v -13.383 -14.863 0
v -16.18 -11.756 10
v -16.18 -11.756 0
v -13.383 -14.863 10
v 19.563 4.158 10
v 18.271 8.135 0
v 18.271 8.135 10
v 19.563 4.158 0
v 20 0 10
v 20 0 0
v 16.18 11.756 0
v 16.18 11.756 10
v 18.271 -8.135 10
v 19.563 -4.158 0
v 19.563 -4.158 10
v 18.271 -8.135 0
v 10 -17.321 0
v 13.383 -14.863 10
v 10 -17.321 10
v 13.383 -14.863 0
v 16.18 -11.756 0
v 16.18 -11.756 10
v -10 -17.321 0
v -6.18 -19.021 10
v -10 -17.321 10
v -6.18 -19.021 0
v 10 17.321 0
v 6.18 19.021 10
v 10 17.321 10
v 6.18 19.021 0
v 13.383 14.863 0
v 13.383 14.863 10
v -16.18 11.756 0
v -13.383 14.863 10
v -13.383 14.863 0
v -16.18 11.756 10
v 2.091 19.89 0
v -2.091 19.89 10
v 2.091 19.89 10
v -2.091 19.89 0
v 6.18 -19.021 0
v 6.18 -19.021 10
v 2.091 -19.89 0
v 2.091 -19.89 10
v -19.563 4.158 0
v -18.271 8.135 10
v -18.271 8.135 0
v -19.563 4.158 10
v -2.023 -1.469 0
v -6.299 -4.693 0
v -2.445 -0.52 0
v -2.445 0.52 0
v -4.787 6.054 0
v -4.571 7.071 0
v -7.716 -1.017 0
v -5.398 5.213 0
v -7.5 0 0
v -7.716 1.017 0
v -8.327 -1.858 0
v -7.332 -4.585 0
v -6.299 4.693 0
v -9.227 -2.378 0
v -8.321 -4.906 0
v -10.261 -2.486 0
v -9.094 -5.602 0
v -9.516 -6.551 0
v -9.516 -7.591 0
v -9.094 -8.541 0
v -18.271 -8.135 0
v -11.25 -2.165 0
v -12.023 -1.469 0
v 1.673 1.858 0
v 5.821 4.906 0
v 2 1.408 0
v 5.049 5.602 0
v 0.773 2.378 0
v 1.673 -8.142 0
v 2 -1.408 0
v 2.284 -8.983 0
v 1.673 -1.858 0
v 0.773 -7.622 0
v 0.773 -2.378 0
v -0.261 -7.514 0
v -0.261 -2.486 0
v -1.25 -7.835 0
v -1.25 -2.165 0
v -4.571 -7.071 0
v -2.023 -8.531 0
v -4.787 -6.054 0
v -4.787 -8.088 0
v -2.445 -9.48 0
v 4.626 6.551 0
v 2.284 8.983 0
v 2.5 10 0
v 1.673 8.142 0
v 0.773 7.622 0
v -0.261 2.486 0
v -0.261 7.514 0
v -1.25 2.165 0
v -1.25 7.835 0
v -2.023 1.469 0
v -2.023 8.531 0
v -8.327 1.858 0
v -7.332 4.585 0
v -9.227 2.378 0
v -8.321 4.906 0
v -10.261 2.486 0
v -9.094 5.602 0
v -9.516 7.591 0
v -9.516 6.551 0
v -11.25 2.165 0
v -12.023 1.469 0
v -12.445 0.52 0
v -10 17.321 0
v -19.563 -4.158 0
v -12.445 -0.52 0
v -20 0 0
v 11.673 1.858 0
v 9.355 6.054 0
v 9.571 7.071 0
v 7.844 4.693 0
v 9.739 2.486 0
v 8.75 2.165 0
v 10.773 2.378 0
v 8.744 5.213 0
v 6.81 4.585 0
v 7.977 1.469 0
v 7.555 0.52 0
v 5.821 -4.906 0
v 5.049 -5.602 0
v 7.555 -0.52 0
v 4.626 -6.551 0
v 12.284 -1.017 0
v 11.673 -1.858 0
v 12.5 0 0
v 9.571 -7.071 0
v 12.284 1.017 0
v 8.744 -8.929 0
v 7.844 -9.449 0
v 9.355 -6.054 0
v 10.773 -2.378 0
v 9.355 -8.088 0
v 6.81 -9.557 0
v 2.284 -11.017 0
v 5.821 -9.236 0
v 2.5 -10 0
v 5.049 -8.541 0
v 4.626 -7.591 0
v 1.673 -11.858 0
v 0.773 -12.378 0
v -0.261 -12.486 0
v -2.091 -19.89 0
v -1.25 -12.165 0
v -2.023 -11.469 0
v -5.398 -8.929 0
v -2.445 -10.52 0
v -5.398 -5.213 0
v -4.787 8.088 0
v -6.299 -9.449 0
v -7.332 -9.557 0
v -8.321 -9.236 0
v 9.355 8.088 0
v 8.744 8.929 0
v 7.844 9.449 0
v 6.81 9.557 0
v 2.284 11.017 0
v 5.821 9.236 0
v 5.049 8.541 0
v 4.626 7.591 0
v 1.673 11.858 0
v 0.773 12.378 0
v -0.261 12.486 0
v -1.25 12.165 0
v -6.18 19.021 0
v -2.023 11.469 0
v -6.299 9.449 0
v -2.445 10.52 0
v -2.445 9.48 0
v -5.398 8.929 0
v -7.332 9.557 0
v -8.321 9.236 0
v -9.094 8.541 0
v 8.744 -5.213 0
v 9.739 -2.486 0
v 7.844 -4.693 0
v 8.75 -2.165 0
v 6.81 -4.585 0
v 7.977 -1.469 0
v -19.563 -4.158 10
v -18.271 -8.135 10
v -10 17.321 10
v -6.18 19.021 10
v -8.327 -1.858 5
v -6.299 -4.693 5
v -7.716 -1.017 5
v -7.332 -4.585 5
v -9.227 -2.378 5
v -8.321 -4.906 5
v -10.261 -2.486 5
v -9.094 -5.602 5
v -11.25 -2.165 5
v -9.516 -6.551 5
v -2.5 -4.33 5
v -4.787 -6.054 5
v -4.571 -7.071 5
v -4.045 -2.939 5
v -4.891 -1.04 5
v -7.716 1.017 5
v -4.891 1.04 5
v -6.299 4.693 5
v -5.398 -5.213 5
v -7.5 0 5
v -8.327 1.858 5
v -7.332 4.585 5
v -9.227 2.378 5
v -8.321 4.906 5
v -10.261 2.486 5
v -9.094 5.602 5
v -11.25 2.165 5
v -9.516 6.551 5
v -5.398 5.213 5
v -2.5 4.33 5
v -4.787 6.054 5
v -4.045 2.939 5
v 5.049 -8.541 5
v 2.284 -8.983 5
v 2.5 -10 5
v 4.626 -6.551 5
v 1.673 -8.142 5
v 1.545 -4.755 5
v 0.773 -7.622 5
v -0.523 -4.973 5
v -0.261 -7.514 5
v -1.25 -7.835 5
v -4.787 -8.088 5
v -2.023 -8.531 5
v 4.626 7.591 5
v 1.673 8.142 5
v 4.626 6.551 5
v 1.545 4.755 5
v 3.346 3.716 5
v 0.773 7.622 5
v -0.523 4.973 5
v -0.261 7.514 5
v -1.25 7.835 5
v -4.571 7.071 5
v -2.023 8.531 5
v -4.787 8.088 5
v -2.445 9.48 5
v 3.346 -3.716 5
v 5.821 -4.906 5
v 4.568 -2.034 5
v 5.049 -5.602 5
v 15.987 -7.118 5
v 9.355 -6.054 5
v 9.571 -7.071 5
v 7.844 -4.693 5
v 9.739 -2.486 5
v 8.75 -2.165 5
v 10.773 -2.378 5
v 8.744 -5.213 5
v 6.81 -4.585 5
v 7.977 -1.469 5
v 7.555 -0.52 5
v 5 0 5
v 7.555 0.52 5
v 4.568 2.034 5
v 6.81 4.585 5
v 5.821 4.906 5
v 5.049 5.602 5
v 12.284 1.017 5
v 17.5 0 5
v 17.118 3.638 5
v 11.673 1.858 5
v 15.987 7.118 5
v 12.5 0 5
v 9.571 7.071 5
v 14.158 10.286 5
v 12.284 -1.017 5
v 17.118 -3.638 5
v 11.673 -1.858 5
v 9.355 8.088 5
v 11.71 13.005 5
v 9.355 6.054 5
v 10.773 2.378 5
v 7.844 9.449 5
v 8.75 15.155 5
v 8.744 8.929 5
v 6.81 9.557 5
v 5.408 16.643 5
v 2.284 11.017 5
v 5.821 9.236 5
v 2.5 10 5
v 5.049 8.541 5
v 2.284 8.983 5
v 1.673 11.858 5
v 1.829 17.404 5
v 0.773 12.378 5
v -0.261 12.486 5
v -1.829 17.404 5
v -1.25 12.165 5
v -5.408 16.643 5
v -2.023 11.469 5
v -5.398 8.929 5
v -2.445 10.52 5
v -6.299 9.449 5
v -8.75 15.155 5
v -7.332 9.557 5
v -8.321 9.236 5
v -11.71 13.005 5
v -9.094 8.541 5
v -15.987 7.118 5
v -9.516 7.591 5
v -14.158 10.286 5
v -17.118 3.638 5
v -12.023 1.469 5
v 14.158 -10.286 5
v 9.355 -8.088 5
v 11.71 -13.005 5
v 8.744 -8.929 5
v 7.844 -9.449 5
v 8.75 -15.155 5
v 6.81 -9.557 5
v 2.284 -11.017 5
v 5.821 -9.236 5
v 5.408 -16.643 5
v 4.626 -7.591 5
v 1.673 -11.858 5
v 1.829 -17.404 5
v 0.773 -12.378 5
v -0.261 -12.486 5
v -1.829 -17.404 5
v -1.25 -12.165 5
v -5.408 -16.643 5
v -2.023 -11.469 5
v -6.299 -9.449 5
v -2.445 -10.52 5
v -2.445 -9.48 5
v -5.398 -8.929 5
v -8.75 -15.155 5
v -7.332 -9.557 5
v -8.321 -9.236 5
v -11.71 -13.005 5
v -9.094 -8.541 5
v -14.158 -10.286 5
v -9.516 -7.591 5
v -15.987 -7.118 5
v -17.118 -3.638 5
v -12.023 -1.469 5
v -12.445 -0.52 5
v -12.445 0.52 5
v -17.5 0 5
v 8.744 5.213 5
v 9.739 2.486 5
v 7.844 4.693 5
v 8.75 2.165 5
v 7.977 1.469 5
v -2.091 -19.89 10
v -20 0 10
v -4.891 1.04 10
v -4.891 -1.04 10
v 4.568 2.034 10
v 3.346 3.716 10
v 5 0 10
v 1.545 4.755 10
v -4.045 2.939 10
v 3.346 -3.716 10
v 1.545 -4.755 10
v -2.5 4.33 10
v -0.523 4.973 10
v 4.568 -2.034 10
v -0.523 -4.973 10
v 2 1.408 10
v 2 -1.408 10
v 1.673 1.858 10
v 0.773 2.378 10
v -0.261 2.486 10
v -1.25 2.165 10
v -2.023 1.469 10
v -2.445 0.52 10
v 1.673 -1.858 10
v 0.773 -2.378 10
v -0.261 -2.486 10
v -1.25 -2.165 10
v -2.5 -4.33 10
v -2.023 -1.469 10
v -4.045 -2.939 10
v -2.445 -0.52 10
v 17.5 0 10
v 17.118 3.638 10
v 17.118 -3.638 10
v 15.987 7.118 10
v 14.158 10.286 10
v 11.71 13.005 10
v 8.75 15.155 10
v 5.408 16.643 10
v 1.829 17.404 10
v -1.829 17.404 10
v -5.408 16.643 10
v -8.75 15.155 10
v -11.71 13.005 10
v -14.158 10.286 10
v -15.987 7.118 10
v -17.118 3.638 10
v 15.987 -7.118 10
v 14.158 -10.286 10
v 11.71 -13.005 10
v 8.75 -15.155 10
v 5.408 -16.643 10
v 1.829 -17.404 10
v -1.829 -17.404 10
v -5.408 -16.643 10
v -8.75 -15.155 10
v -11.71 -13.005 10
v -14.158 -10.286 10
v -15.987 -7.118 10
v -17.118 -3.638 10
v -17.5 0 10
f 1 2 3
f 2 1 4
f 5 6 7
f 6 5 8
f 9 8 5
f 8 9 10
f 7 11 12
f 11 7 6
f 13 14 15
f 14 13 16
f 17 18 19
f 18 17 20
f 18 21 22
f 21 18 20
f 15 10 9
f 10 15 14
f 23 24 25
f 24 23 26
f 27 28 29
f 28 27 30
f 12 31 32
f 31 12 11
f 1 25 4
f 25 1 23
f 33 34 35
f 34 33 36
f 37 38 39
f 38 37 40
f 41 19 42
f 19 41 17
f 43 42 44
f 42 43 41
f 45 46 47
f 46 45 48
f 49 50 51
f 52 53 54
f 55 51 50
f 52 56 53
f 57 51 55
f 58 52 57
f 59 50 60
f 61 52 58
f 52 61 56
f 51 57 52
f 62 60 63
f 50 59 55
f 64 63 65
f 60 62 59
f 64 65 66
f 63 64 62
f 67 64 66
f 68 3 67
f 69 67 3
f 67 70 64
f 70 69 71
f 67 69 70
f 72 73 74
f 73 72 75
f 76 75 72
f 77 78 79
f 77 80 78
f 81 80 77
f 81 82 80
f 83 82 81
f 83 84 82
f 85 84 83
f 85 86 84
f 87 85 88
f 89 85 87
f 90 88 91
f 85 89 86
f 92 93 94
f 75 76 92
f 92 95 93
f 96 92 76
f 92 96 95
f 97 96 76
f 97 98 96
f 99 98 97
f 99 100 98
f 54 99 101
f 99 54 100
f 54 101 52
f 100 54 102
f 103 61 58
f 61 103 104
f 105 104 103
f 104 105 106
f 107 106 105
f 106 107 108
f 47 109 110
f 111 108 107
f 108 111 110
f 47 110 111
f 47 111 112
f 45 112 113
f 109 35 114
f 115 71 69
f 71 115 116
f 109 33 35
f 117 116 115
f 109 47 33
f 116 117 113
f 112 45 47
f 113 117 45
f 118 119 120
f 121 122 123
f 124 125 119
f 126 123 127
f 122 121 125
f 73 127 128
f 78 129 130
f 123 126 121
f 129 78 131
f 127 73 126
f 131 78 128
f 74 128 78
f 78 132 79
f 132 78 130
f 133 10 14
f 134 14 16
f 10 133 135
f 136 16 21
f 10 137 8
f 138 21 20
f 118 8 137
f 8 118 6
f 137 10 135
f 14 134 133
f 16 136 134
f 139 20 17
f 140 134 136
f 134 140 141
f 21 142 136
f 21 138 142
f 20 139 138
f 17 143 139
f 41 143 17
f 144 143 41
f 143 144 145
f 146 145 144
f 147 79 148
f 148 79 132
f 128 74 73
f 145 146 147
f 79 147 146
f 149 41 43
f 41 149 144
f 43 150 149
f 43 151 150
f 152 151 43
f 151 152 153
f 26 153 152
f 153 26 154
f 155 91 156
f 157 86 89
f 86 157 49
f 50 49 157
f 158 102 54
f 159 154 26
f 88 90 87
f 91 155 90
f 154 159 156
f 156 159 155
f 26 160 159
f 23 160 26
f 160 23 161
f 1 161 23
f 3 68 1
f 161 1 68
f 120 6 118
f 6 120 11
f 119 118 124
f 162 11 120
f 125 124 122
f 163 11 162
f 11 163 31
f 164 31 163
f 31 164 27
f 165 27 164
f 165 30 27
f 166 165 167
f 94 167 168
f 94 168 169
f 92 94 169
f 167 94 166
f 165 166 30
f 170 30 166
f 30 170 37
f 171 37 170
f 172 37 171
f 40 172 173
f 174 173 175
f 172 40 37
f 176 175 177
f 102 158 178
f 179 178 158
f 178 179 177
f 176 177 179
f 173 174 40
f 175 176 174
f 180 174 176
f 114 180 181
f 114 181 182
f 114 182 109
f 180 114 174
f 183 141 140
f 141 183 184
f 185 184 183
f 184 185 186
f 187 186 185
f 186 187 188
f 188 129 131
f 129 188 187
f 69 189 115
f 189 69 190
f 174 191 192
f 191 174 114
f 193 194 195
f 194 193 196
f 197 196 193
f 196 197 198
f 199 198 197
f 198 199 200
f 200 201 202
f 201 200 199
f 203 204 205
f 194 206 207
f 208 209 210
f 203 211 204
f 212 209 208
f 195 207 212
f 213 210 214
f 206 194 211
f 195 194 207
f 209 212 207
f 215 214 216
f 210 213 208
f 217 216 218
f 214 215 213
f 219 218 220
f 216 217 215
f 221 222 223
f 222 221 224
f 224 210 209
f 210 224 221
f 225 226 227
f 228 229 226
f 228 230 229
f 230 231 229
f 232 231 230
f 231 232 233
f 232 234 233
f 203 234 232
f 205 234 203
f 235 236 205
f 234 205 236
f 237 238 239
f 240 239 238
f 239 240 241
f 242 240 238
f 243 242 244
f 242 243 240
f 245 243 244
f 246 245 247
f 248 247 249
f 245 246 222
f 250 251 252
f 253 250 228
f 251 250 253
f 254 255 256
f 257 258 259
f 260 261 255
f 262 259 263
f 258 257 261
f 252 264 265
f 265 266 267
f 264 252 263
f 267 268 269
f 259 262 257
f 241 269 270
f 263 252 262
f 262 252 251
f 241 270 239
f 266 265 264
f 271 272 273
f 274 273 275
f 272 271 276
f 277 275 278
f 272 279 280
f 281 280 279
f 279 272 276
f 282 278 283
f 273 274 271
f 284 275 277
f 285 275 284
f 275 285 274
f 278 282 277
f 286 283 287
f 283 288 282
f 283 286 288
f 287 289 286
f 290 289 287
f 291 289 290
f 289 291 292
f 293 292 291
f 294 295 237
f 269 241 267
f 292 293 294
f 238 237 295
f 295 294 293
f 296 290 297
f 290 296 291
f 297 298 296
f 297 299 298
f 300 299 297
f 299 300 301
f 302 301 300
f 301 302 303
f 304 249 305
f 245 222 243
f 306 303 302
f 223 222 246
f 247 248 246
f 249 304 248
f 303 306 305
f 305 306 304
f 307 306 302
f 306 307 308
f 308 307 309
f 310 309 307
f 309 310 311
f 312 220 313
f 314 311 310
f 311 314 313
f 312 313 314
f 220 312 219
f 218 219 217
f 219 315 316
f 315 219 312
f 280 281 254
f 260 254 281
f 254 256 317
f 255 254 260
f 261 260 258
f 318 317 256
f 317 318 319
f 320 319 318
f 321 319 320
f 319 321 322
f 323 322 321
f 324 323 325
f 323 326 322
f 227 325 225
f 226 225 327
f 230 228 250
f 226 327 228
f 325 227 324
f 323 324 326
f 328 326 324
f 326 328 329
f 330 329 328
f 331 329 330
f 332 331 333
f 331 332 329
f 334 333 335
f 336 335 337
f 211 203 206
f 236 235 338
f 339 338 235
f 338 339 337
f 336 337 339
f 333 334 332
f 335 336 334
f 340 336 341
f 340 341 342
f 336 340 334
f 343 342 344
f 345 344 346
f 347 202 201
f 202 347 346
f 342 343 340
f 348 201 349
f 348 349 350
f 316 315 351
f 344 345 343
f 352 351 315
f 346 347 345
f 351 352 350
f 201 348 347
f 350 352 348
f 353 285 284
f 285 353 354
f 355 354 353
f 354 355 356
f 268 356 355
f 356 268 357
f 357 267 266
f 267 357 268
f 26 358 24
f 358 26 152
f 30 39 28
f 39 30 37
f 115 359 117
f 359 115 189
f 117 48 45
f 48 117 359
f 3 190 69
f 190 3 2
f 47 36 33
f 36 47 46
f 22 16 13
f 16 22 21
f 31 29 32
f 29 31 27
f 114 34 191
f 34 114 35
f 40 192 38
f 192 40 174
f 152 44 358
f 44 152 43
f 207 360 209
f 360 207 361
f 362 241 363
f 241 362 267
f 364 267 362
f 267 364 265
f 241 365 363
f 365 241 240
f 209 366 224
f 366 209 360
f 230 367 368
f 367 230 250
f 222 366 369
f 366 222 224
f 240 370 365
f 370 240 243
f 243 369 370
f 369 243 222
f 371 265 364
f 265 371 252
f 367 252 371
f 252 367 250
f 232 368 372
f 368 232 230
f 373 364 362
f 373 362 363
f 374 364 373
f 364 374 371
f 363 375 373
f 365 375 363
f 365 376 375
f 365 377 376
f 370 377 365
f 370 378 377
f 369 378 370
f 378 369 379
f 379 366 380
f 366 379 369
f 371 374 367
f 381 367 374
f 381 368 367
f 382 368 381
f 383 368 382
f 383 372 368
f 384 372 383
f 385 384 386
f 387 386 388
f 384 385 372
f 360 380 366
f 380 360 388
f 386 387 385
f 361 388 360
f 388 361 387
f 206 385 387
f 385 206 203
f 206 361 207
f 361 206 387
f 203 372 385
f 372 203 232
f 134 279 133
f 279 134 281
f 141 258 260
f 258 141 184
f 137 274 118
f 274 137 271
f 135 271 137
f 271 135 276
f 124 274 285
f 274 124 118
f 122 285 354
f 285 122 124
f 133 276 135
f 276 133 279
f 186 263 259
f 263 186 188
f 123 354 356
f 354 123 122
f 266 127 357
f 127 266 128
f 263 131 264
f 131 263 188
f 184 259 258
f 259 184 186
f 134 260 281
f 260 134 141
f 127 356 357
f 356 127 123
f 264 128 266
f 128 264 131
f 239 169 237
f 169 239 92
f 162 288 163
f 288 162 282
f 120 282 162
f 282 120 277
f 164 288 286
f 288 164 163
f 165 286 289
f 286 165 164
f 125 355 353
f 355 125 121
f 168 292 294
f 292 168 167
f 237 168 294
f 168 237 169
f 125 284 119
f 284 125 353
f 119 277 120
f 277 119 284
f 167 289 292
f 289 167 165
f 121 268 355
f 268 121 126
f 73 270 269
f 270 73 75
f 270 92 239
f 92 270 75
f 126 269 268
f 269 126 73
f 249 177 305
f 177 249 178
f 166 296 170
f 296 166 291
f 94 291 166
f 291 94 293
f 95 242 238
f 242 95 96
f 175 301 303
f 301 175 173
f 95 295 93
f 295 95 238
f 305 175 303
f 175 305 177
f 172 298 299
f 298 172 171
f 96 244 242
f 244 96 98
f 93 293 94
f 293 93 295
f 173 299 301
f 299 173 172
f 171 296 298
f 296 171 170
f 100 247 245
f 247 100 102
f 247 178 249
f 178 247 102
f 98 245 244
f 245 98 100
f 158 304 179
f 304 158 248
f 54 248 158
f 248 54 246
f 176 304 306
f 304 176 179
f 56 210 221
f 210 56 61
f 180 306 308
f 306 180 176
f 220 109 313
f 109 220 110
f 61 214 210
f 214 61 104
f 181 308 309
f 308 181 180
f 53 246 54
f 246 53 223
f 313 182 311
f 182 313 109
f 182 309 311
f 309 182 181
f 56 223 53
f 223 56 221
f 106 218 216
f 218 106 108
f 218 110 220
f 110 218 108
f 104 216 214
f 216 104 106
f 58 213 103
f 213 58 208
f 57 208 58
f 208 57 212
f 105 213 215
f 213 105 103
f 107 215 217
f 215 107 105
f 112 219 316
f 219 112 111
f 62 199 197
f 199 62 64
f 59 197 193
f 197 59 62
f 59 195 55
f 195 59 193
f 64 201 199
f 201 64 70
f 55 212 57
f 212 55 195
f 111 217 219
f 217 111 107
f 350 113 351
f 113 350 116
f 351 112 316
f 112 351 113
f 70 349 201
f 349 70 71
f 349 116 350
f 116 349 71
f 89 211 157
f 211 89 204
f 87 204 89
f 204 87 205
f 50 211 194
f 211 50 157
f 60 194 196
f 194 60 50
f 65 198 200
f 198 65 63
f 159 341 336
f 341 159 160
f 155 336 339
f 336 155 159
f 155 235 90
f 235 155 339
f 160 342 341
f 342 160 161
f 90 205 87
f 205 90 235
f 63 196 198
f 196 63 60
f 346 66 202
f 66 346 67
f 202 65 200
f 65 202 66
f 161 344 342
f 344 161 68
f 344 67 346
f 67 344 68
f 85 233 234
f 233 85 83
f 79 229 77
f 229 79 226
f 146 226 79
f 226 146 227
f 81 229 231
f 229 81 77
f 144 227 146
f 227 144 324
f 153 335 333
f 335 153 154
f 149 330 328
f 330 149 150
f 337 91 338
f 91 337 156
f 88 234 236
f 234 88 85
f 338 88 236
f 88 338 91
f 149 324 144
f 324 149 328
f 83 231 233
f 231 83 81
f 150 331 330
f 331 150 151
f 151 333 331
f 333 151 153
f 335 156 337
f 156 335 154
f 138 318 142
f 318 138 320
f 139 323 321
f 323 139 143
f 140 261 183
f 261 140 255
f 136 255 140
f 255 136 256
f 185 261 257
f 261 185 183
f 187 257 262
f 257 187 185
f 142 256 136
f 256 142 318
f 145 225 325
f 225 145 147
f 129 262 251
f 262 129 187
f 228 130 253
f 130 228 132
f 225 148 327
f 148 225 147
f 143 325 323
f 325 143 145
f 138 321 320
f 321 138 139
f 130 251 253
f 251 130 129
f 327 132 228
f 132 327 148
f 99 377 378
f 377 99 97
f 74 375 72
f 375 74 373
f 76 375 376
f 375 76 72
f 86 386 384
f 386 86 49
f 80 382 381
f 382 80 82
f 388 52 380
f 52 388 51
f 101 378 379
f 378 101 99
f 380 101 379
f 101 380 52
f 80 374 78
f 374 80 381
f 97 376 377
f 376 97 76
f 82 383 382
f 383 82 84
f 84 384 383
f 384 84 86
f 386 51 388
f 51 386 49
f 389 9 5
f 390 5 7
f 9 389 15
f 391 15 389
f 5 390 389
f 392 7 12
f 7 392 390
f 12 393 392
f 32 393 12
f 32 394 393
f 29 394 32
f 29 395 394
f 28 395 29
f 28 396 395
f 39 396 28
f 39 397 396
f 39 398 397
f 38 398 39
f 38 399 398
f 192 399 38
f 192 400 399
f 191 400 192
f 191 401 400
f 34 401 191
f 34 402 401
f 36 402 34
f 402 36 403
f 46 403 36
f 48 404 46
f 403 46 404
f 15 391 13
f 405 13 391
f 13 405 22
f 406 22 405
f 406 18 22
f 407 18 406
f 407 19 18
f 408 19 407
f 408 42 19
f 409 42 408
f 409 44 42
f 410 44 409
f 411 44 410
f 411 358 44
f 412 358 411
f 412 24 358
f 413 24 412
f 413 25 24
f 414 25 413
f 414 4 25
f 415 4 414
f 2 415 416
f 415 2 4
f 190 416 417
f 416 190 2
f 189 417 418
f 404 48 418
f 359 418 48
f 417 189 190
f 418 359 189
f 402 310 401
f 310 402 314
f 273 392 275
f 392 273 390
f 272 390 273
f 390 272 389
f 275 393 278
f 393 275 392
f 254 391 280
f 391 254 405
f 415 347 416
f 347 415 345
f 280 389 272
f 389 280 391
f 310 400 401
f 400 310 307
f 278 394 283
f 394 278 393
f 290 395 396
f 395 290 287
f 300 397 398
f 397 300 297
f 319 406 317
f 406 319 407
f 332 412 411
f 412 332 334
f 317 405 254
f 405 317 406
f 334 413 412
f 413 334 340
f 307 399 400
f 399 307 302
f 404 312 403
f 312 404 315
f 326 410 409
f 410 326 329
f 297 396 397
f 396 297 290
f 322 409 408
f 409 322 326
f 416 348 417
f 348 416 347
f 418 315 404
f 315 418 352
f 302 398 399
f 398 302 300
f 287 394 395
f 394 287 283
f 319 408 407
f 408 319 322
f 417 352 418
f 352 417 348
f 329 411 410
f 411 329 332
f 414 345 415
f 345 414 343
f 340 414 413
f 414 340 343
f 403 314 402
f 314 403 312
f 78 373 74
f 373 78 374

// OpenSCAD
//Autor: Martín Cancio Barrera, UO287561

h_base = 5;
d_base = 40;

h_central = 10;
d_central = 10;
fn_central = 15;

h_holes = 5;
d_holes = 5;
fn_holes = 15;
hole_radius = 10;
hole_count = 8;

h_cylinder = 30;
d_cylinder = 5;
fn_cylinder = 15;

h_border = 10;
d_border_outer = 40;
d_border_inner = 35;

module 20W(){
    difference(){
        base();
        holes();
        cylinder(h = h_cylinder, d = d_cylinder, $fn = fn_cylinder, center = true);
    }
    
    translate([3,0,5])
    cube([2, 5, 10], center = true);
    
    border();
}

module base(){
    cylinder(h = h_base, d = d_base);

    cylinder(h = h_central, d = d_central, $fn = fn_central);
}

module holes(){
    for(i = [0:360/hole_count:360]) {
        translate([hole_radius * cos(i), hole_radius * sin(i), 0])
        cylinder(h = h_holes, d = d_holes, $fn = fn_holes);
    }
}

module border(){
    difference(){
        cylinder(h = h_border, d = d_border_outer);
        cylinder(h = h_border, d = d_border_inner);
    }
}
20W();
